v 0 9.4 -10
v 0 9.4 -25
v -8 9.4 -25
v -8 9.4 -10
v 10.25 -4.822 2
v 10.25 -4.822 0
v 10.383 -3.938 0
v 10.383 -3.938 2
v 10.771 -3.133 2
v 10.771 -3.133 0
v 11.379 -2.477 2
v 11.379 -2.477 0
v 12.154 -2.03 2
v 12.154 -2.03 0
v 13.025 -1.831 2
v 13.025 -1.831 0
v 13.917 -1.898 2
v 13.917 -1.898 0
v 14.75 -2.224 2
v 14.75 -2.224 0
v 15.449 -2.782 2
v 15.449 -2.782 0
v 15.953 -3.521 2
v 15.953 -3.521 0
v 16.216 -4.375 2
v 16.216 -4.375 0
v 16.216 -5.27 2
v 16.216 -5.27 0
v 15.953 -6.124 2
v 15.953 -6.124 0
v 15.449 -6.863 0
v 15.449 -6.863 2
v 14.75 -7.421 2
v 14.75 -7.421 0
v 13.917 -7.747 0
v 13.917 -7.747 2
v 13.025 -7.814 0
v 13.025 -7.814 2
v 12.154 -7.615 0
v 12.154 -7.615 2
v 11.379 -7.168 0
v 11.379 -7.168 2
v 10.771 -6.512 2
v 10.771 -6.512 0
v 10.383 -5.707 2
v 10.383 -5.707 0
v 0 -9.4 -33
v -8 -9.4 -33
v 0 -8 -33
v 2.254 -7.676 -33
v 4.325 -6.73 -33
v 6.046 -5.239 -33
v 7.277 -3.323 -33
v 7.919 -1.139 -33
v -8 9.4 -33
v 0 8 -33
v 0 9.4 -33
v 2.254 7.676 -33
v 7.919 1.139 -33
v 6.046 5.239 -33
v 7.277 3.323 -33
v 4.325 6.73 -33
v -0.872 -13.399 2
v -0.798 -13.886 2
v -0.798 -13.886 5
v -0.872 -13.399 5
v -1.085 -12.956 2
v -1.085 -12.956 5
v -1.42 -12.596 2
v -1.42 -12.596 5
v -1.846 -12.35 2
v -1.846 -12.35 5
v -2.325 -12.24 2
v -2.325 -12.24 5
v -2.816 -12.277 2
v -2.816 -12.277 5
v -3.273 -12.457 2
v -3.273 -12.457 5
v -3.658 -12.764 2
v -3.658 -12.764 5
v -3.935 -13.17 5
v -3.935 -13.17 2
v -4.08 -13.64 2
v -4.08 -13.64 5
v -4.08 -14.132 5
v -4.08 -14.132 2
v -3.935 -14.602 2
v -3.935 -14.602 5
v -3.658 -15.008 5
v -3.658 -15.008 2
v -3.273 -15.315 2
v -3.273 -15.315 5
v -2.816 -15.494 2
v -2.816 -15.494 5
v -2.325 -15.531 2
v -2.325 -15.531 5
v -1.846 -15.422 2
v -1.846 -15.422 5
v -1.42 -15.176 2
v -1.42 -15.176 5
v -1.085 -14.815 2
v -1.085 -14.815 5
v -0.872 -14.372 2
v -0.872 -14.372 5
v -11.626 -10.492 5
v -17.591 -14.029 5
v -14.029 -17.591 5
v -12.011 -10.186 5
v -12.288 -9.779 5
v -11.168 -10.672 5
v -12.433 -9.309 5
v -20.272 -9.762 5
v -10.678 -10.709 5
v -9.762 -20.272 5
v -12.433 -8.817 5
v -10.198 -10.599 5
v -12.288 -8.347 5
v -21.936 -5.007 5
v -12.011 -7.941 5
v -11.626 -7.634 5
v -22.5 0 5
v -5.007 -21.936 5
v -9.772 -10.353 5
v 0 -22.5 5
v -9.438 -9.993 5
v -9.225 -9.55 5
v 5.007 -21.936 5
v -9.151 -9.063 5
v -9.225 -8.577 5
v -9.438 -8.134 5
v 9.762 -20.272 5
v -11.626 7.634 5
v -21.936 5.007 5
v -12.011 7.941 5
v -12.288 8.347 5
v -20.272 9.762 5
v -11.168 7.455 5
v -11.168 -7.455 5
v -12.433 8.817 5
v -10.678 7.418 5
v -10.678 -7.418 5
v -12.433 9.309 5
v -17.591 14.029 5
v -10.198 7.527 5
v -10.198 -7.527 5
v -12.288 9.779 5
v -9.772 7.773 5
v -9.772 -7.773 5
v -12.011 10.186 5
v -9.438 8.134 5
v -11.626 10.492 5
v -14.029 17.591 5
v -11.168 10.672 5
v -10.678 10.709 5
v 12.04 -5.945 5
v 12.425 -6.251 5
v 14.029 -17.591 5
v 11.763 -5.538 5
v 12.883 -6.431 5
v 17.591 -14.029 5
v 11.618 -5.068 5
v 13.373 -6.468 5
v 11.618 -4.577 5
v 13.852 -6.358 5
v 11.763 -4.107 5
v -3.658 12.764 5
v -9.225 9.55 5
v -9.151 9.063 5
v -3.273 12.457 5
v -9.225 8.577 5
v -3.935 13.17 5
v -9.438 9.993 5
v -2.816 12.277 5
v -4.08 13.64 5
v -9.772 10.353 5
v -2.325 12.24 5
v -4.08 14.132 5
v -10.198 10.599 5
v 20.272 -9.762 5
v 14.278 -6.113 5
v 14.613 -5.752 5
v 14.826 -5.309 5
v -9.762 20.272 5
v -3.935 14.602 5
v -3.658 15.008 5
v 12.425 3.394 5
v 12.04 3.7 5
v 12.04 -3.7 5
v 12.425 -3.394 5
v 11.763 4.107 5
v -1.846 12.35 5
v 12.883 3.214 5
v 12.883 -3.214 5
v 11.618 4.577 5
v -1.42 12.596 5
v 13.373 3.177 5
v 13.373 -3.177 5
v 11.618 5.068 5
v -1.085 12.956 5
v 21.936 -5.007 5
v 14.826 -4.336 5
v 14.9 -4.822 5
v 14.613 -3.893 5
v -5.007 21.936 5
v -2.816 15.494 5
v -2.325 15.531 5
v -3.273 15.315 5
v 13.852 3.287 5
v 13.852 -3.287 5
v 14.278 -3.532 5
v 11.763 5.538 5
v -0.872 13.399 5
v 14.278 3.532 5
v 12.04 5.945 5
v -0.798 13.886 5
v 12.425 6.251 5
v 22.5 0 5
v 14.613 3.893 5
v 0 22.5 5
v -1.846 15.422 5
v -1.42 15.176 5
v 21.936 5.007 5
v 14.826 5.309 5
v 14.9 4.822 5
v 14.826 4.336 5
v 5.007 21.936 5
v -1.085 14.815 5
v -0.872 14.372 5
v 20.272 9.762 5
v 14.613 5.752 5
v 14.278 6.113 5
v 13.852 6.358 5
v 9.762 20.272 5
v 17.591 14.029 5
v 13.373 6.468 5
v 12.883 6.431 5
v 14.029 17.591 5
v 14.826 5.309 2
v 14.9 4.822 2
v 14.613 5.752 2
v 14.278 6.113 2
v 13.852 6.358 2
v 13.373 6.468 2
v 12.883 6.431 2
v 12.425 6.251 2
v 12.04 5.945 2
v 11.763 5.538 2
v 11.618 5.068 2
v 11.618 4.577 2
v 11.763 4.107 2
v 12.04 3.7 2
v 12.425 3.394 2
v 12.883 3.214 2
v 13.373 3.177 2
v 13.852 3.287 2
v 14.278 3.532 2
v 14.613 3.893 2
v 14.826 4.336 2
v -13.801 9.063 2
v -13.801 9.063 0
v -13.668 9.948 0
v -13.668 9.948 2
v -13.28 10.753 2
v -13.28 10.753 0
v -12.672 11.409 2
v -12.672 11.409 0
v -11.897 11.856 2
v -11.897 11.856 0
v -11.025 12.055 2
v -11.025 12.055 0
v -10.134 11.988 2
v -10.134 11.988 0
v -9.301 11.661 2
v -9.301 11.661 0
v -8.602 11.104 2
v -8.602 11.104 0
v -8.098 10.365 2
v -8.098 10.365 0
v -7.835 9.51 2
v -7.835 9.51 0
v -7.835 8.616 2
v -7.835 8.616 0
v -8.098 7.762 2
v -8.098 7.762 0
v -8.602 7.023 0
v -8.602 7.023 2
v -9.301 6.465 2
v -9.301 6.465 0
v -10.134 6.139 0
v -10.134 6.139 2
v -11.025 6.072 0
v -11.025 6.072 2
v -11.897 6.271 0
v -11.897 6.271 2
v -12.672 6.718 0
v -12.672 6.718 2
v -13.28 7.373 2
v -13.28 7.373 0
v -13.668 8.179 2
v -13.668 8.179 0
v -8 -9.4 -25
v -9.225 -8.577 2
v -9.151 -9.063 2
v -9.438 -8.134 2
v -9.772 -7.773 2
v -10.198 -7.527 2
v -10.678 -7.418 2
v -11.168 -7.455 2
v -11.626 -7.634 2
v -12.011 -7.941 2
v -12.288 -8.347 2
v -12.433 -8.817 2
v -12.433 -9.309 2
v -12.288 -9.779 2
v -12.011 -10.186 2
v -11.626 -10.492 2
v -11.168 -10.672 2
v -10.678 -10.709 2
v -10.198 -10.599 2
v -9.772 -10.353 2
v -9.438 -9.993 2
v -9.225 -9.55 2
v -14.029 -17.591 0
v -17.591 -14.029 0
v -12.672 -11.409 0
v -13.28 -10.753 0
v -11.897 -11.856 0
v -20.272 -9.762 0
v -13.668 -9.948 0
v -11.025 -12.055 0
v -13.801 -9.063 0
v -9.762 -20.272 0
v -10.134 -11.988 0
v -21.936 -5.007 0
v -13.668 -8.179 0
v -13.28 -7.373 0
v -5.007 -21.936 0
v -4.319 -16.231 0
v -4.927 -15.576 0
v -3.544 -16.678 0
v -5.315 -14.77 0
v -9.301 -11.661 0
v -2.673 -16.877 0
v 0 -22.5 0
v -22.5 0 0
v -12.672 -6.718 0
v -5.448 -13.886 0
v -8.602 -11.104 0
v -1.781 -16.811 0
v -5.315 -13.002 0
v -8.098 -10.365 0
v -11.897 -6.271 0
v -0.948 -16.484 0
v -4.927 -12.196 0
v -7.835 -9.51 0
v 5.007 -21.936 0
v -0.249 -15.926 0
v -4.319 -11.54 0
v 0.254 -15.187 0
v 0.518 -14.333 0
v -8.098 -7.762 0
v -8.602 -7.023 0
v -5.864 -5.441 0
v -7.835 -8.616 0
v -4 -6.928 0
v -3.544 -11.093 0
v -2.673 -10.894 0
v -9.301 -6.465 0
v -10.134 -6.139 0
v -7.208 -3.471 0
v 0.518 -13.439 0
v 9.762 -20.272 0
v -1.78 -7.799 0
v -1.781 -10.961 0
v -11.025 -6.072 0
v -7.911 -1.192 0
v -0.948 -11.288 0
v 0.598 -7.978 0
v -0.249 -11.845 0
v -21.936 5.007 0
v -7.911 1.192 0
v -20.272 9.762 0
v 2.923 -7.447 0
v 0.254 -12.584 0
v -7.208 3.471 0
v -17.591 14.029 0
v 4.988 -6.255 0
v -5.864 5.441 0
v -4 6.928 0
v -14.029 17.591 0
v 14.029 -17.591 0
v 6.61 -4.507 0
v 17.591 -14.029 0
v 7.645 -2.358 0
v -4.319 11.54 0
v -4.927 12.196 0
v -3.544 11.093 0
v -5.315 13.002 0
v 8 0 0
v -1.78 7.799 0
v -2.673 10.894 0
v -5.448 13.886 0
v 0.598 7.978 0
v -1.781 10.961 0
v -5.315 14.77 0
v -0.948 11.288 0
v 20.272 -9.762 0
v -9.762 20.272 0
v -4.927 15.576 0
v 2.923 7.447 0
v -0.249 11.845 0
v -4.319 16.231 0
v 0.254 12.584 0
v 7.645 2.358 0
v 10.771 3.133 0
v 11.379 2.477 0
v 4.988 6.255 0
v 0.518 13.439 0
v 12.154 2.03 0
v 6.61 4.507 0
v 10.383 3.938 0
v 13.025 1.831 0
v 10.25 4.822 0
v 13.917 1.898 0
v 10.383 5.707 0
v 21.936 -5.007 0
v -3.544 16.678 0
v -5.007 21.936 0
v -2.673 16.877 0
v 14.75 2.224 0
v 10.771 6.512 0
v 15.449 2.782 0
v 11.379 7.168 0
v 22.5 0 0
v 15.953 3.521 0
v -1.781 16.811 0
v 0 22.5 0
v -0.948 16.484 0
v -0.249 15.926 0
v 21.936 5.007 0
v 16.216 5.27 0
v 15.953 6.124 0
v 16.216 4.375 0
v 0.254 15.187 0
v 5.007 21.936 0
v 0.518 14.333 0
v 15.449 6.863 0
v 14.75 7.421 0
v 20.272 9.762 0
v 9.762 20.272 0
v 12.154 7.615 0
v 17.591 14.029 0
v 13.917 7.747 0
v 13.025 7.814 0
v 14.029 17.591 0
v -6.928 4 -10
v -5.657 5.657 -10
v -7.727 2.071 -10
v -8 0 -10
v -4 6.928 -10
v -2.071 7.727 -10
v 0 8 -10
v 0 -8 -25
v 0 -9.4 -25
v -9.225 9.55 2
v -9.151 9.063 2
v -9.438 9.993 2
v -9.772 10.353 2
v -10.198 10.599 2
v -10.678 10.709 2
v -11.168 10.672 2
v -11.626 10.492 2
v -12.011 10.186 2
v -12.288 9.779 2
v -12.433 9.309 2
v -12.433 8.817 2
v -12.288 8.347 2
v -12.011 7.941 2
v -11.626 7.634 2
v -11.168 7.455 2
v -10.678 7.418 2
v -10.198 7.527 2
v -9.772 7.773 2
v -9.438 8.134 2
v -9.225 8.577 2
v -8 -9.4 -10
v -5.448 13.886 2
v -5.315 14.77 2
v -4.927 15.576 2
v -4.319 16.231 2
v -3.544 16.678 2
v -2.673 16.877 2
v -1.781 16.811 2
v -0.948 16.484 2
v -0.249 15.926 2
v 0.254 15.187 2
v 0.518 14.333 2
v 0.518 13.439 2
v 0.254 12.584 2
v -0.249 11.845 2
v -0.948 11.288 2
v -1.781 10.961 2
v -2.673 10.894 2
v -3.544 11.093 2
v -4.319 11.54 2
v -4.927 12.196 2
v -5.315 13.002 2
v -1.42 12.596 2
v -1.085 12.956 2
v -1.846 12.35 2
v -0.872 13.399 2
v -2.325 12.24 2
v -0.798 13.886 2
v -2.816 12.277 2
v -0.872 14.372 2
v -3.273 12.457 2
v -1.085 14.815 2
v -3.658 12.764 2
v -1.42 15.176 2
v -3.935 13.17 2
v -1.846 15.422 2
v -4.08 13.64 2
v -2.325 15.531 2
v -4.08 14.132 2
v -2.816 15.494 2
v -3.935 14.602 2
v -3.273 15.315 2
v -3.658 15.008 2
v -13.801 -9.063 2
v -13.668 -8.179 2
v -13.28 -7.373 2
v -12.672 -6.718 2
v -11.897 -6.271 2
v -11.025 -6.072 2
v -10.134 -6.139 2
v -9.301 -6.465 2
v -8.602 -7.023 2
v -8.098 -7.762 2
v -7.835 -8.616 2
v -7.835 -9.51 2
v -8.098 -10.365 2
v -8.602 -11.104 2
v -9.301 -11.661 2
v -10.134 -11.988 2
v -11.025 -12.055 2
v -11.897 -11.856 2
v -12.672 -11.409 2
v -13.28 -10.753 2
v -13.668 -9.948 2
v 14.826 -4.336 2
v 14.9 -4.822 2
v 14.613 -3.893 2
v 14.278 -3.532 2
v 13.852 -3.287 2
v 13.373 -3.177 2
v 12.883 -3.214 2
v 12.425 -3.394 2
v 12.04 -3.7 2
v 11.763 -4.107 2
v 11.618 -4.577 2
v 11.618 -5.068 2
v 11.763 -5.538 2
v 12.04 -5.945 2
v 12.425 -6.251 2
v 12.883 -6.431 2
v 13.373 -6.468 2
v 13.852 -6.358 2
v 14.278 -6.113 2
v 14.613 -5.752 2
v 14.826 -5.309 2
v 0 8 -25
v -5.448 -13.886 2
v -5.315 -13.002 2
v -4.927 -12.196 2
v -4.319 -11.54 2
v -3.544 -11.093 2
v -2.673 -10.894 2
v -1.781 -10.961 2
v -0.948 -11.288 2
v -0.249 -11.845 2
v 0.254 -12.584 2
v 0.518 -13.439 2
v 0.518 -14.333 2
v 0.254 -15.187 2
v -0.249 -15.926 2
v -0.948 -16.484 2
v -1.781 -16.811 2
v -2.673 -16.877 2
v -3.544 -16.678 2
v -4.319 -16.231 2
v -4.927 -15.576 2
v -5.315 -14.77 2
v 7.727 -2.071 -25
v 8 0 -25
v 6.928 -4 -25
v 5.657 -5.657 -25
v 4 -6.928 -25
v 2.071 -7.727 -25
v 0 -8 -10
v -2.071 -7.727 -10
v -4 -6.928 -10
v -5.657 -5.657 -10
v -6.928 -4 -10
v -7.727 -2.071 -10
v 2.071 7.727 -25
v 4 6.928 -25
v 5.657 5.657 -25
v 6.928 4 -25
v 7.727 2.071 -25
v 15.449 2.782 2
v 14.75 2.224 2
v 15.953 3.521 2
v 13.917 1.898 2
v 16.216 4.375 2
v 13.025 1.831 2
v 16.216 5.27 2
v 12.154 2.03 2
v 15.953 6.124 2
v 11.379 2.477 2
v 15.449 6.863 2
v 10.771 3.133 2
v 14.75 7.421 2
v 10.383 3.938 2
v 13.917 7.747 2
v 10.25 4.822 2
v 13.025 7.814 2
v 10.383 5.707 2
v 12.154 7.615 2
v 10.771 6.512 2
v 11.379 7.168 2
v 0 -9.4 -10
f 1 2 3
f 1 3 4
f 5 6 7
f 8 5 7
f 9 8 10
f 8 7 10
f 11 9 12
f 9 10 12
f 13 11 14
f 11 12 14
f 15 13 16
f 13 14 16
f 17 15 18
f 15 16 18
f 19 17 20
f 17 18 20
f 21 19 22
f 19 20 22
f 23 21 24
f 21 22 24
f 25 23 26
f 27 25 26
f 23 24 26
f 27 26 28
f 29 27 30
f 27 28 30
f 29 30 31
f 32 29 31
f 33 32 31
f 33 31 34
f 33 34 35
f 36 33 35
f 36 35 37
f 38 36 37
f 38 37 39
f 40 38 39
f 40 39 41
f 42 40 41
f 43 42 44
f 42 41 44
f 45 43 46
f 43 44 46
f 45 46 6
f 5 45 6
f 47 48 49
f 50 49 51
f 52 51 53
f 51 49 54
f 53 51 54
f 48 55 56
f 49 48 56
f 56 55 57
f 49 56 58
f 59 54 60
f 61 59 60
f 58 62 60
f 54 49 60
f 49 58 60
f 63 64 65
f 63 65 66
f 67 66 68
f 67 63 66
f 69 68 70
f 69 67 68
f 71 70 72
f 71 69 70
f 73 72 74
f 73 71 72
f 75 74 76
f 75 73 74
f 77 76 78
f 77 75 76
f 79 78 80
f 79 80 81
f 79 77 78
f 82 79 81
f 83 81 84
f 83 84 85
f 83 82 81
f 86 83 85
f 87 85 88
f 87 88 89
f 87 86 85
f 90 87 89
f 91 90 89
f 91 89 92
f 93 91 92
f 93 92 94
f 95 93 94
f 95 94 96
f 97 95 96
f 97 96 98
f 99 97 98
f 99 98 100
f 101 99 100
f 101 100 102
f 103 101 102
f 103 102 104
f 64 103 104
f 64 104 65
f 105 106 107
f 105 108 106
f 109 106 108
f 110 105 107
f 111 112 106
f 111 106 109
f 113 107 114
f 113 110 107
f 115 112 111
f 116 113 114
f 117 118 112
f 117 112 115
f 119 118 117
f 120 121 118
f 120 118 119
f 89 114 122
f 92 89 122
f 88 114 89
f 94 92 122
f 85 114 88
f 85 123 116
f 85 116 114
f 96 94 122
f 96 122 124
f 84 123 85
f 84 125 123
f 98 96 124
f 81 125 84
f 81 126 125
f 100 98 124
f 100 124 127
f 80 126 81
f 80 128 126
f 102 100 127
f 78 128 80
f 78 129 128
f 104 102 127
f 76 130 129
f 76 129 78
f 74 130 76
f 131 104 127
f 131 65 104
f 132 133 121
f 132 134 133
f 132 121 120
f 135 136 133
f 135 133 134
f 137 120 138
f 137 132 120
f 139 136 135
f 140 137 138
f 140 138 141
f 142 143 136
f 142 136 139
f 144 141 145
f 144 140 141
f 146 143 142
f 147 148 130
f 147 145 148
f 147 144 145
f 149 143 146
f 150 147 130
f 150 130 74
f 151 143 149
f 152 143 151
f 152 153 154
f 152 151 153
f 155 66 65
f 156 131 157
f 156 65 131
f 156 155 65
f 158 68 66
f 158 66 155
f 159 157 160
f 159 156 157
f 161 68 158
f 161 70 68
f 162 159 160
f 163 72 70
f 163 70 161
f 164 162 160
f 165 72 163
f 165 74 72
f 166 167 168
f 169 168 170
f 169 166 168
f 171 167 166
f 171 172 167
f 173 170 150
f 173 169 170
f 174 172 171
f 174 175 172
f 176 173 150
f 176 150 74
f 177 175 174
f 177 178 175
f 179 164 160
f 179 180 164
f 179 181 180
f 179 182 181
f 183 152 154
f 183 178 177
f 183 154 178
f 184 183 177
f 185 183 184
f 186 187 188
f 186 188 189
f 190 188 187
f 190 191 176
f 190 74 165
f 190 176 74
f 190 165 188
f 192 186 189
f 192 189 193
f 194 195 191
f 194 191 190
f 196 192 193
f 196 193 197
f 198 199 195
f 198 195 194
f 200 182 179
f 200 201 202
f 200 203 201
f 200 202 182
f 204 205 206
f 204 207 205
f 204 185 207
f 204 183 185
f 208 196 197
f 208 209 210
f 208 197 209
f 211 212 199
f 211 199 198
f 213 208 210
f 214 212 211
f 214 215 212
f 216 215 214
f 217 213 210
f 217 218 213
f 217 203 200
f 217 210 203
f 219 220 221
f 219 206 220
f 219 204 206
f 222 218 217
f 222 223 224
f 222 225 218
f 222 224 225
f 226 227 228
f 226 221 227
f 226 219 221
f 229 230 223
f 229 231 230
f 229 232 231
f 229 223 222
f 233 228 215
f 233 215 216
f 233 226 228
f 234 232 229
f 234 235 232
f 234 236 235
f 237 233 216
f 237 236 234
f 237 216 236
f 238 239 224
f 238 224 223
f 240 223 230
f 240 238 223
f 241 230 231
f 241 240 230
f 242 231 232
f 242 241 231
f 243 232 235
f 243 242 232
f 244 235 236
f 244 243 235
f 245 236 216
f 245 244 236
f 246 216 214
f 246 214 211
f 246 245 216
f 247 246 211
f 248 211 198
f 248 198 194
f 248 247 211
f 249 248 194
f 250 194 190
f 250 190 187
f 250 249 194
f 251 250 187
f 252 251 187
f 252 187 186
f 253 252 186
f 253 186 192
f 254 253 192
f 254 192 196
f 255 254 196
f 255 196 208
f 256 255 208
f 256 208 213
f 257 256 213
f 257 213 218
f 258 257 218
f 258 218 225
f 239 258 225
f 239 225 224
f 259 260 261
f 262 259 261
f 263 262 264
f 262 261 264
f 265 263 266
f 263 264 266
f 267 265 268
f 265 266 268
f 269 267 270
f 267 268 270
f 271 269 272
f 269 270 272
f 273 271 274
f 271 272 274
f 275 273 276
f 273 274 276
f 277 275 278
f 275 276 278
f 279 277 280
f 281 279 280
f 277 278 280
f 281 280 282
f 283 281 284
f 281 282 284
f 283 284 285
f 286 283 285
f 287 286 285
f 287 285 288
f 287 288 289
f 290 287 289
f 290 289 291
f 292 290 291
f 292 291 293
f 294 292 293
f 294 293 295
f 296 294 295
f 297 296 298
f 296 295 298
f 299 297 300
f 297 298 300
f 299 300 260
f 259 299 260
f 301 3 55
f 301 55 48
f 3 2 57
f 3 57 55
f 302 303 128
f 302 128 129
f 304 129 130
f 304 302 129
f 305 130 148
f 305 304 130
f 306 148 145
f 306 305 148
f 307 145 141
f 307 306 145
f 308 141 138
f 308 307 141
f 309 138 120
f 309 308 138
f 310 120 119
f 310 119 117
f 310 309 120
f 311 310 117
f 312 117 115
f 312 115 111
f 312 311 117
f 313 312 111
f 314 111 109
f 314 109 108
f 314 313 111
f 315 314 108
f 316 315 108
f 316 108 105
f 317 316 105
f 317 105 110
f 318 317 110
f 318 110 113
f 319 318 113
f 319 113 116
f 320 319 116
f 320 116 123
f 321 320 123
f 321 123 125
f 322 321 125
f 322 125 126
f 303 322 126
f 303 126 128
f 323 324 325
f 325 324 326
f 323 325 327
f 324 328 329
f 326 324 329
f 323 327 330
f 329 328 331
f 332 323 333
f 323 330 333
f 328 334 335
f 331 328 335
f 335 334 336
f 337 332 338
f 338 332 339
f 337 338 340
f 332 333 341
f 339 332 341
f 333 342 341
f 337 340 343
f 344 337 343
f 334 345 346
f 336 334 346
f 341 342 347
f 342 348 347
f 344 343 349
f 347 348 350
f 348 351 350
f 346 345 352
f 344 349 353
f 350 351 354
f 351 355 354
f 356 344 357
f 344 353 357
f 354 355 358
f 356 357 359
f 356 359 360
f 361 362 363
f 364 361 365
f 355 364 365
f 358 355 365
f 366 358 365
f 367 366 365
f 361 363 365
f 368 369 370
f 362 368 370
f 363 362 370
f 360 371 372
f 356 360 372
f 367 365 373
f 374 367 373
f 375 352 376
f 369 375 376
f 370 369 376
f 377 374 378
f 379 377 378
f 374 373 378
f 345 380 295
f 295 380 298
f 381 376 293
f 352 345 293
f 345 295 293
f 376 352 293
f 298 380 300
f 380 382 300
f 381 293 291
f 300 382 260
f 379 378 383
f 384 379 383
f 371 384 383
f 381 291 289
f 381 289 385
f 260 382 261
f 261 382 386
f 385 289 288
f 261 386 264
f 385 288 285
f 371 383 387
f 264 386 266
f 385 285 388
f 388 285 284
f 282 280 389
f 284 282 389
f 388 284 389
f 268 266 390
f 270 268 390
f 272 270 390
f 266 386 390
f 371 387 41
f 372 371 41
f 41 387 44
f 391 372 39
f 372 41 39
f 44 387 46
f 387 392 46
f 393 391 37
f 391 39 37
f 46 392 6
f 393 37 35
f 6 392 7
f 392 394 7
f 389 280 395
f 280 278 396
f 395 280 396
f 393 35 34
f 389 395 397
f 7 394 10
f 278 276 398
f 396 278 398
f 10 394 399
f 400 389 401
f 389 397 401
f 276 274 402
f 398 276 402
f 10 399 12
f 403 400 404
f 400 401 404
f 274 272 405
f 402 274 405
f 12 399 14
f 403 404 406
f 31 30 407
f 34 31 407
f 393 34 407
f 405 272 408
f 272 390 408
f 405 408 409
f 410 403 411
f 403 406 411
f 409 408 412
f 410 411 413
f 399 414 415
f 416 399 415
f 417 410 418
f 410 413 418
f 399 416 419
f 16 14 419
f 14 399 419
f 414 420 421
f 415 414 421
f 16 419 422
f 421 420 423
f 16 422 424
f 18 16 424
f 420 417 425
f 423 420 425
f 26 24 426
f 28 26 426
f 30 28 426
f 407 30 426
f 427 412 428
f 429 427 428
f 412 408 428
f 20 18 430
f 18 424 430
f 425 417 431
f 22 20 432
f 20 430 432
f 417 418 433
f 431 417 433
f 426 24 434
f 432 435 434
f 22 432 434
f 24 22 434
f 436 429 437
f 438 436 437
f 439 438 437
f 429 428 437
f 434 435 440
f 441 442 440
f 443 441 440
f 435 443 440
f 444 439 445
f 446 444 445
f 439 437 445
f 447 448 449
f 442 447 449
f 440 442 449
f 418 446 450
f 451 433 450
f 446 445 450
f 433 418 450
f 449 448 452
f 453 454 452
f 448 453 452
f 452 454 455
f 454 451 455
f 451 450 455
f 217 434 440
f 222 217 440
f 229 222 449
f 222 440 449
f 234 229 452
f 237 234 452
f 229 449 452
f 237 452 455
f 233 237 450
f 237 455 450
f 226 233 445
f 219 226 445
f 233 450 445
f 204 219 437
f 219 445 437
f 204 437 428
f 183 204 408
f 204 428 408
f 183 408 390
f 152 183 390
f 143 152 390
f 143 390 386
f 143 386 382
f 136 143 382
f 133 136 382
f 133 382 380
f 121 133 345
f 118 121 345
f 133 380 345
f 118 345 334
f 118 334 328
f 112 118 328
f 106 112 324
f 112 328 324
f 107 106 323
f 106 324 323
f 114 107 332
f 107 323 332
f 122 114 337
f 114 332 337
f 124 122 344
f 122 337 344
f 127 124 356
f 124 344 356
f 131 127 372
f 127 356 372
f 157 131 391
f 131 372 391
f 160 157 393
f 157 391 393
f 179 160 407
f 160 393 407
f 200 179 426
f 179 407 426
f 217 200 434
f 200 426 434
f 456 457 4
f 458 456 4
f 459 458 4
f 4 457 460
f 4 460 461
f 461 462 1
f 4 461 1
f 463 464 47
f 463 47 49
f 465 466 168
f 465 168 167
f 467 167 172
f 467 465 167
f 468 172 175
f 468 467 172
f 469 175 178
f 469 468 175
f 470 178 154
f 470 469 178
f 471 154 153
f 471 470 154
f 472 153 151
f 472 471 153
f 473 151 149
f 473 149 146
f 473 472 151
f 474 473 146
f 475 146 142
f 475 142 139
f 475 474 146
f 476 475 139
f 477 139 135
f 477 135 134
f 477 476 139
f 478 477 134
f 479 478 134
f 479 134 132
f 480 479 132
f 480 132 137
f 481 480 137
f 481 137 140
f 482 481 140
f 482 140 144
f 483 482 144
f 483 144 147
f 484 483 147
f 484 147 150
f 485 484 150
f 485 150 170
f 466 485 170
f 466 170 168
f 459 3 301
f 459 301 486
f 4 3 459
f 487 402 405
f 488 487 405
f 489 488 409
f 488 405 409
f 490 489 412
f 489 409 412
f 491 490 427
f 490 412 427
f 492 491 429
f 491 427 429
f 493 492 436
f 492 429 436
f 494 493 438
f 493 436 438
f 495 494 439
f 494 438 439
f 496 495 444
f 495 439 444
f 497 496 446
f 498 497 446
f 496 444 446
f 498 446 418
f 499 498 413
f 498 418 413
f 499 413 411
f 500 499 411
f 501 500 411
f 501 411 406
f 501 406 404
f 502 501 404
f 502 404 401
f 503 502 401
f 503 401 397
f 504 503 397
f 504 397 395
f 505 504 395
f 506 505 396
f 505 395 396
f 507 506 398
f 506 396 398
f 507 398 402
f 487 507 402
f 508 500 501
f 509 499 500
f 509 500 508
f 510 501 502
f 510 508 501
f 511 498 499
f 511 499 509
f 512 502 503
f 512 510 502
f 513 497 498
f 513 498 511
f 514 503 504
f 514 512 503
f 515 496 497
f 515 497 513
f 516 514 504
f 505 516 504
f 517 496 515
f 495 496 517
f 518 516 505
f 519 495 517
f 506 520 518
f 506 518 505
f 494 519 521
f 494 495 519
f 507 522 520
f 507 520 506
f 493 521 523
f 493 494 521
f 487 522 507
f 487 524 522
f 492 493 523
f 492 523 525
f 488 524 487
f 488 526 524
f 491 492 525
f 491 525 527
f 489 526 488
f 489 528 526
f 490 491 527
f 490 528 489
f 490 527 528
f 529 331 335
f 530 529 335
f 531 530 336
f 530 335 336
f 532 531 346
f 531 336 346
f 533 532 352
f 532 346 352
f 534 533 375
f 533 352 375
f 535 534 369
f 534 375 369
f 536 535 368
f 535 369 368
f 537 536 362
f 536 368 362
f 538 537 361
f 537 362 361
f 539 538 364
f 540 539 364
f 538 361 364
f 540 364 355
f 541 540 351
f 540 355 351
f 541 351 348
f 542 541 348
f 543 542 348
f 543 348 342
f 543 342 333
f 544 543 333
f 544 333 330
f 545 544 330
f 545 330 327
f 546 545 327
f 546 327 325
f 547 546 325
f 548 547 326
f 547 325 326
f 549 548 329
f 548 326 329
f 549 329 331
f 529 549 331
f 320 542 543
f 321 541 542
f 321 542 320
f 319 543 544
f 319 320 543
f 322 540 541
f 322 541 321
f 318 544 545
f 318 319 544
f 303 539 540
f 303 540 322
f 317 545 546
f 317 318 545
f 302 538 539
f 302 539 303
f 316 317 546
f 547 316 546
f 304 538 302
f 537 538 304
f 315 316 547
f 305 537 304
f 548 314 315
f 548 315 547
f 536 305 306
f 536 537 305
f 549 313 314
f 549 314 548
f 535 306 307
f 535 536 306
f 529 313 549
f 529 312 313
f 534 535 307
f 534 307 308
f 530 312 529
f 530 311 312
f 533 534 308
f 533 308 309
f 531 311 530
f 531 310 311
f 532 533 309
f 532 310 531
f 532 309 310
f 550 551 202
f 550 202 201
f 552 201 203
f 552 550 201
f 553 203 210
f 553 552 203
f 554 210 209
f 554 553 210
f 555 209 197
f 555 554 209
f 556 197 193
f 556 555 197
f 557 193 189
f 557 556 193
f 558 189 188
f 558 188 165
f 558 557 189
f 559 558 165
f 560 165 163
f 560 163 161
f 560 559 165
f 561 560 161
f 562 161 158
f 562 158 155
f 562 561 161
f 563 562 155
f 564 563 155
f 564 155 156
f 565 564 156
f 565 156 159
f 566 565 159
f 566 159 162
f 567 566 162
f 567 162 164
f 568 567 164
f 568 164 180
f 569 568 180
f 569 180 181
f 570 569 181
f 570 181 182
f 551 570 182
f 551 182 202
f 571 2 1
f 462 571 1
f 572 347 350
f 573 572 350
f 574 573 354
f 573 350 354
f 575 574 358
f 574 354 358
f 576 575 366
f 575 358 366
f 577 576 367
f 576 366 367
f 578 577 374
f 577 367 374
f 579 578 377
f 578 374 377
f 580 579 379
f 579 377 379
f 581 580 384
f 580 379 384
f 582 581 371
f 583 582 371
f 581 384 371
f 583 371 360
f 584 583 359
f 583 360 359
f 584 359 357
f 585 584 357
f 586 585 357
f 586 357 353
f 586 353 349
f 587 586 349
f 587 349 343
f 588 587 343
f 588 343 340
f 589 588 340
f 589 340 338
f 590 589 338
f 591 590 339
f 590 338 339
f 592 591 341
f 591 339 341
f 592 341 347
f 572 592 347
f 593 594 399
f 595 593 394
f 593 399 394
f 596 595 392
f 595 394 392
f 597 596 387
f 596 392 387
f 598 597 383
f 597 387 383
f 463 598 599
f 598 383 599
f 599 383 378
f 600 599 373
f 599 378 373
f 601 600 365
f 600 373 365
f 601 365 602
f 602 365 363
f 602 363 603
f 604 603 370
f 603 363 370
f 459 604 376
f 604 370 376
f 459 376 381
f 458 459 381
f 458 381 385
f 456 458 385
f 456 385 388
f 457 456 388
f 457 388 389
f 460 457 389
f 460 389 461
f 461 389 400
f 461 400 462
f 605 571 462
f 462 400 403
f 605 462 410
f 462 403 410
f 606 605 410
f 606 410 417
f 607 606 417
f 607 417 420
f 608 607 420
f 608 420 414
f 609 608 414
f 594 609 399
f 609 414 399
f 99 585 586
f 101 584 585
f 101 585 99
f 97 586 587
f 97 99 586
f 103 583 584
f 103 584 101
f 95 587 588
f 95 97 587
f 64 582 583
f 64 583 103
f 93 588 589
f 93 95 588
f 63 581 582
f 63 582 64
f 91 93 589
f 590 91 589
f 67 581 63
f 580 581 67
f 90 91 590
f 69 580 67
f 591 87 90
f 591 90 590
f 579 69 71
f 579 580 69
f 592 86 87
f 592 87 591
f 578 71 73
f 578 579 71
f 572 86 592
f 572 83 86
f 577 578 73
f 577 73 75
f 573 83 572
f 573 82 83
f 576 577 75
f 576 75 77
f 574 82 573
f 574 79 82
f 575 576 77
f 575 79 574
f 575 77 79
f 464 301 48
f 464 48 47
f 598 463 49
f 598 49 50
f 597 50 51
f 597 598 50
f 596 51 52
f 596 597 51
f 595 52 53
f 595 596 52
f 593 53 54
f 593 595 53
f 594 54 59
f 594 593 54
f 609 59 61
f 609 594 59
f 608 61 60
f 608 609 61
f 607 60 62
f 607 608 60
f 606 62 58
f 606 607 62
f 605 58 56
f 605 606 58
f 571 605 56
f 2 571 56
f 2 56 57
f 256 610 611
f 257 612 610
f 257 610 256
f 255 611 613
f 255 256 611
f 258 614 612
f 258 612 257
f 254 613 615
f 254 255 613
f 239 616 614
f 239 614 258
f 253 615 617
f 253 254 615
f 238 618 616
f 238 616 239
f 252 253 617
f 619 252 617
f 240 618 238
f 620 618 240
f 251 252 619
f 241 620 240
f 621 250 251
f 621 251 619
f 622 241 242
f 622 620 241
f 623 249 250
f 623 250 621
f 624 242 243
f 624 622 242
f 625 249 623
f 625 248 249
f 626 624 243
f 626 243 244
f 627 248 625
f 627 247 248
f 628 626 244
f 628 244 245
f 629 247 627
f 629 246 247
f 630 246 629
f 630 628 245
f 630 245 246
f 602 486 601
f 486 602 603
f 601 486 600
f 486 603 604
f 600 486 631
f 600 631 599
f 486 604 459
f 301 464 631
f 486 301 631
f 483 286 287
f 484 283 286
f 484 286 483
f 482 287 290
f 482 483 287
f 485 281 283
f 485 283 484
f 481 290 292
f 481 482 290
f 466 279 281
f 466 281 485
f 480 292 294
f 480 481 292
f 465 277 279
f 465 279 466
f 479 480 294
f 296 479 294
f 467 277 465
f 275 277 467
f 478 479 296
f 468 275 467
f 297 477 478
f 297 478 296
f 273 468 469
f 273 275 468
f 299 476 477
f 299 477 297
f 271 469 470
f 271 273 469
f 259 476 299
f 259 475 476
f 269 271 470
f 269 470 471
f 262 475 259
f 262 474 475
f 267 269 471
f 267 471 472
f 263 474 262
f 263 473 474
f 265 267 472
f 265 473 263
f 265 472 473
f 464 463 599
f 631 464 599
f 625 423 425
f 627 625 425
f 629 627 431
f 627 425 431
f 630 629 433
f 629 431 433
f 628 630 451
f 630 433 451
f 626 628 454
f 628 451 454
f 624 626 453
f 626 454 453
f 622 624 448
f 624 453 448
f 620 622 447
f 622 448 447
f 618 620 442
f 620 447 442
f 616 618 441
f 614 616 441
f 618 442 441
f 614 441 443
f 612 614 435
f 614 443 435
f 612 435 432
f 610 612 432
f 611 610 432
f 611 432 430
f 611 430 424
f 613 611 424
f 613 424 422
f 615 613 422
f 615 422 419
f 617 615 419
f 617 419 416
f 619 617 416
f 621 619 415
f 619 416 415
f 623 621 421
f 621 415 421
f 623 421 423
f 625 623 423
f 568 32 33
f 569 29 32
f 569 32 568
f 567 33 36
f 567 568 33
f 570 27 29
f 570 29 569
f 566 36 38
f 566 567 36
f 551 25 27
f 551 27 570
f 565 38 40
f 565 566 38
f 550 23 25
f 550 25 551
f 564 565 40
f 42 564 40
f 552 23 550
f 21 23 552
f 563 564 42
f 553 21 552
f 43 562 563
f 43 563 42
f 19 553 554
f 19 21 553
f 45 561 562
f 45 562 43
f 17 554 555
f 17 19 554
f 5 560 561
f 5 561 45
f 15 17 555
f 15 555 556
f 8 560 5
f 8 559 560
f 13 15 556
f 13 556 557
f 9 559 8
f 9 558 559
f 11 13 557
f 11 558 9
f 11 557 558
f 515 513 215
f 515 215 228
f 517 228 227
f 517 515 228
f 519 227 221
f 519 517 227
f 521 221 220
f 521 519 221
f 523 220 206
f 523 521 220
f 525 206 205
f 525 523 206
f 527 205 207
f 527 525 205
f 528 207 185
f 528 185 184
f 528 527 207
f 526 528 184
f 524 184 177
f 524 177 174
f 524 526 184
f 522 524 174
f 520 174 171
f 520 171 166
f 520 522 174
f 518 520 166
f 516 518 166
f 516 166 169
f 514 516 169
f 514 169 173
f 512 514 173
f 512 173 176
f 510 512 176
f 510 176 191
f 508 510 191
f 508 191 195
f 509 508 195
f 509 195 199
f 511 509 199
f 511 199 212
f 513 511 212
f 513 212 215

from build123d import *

# Parameters (mm, degrees)
SKETCH_1_R               = 22.5
SKETCH_1_R_2             = 1.65
EXTRUDE_1_DEPTH          = 5
SKETCH_3_R               = 3
CUT_EXTRUDE_1_DEPTH      = 2
SKETCH_11_R              = 8
EXTRUDE_2_DEPTH          = 25
CUT_EXTRUDE_9_DEPTH      = 25
CUT_EXTRUDE_9_DEPTH_BACK = 25
SKETCH_12_W              = 8
SKETCH_12_H              = 15
SKETCH_13_W              = 15
SKETCH_13_H              = 18.8
EXTRUDE_3_DEPTH          = 8
EXTRUDE_5_DEPTH          = 8


with BuildPart() as part:
    # 스케치1 → 보스-돌출1 (new body)
    with BuildSketch(Plane.XY):
        Circle(SKETCH_1_R)
        with Locations((-2.448439305, 13.885789317)):
            Circle(SKETCH_1_R_2, mode=Mode.SUBTRACT)
        with Locations((-10.801226648, 9.063305297)):
            Circle(SKETCH_1_R_2, mode=Mode.SUBTRACT)
        with Locations((13.249665953, 4.822484021)):
            Circle(SKETCH_1_R_2, mode=Mode.SUBTRACT)
        with Locations((13.249665953, -4.822484021)):
            Circle(SKETCH_1_R_2, mode=Mode.SUBTRACT)
        with Locations((-2.448439305, -13.885789317)):
            Circle(SKETCH_1_R_2, mode=Mode.SUBTRACT)
        with Locations((-10.801226648, -9.063305297)):
            Circle(SKETCH_1_R_2, mode=Mode.SUBTRACT)
    extrude(amount=EXTRUDE_1_DEPTH)

    # 스케치3 → 컷-돌출1 (cut)
    with BuildSketch(Plane(origin=(0, 0, 0), x_dir=(-1, 0, 0), z_dir=(0, 0, -1))):
        with Locations((2.448439305, 13.885789317)):
            Circle(SKETCH_3_R)
        with Locations((10.801226648, 9.063305297)):
            Circle(SKETCH_3_R)
        with Locations((10.801226648, -9.063305297)):
            Circle(SKETCH_3_R)
        with Locations((2.448439305, -13.885789317)):
            Circle(SKETCH_3_R)
        with Locations((-13.249665953, -4.822484021)):
            Circle(SKETCH_3_R)
        with Locations((-13.249665953, 4.822484021)):
            Circle(SKETCH_3_R)
    extrude(amount=-CUT_EXTRUDE_1_DEPTH, mode=Mode.SUBTRACT)

    # 스케치11 → 보스-돌출2 (add)
    with BuildSketch(Plane(origin=(0, 0, 0), x_dir=(-1, 0, 0), z_dir=(0, 0, -1))):
        Circle(SKETCH_11_R)
    extrude(amount=EXTRUDE_2_DEPTH)

    # 스케치12 → 컷-돌출9 (cut, two sides: drawn at the far end of the back side and taken through both)
    with BuildSketch(Plane(origin=(0, 0, 0), x_dir=(1, 0, 0), z_dir=(0, 1, 0)).offset(-CUT_EXTRUDE_9_DEPTH_BACK)):
        with Locations((-4, 17.5)):
            Rectangle(SKETCH_12_W, SKETCH_12_H)
    extrude(amount=CUT_EXTRUDE_9_DEPTH + CUT_EXTRUDE_9_DEPTH_BACK, mode=Mode.SUBTRACT)

    # 스케치13 → 보스-돌출3 (add)
    with BuildSketch(Plane.ZY):
        with Locations((-17.5, 0)):
            Rectangle(SKETCH_13_W, SKETCH_13_H)
    extrude(amount=EXTRUDE_3_DEPTH)

    # 스케치15 → 보스-돌출5 (add)
    with BuildSketch(Plane(origin=(0, 0, -25), x_dir=(-1, 0, 0), z_dir=(0, 0, -1))):
        with BuildLine():
            Line((0, 8), (0, 9.4))
            Line((0, 9.4), (8, 9.4))
            Line((8, 9.4), (8, -9.4))
            Line((8, -9.4), (0, -9.4))
            Line((0, -9.4), (0, -8))
            ThreePointArc((0, -8), (-8, 0), (0, 8))
        make_face()
    extrude(amount=EXTRUDE_5_DEPTH)


solid = part.part
